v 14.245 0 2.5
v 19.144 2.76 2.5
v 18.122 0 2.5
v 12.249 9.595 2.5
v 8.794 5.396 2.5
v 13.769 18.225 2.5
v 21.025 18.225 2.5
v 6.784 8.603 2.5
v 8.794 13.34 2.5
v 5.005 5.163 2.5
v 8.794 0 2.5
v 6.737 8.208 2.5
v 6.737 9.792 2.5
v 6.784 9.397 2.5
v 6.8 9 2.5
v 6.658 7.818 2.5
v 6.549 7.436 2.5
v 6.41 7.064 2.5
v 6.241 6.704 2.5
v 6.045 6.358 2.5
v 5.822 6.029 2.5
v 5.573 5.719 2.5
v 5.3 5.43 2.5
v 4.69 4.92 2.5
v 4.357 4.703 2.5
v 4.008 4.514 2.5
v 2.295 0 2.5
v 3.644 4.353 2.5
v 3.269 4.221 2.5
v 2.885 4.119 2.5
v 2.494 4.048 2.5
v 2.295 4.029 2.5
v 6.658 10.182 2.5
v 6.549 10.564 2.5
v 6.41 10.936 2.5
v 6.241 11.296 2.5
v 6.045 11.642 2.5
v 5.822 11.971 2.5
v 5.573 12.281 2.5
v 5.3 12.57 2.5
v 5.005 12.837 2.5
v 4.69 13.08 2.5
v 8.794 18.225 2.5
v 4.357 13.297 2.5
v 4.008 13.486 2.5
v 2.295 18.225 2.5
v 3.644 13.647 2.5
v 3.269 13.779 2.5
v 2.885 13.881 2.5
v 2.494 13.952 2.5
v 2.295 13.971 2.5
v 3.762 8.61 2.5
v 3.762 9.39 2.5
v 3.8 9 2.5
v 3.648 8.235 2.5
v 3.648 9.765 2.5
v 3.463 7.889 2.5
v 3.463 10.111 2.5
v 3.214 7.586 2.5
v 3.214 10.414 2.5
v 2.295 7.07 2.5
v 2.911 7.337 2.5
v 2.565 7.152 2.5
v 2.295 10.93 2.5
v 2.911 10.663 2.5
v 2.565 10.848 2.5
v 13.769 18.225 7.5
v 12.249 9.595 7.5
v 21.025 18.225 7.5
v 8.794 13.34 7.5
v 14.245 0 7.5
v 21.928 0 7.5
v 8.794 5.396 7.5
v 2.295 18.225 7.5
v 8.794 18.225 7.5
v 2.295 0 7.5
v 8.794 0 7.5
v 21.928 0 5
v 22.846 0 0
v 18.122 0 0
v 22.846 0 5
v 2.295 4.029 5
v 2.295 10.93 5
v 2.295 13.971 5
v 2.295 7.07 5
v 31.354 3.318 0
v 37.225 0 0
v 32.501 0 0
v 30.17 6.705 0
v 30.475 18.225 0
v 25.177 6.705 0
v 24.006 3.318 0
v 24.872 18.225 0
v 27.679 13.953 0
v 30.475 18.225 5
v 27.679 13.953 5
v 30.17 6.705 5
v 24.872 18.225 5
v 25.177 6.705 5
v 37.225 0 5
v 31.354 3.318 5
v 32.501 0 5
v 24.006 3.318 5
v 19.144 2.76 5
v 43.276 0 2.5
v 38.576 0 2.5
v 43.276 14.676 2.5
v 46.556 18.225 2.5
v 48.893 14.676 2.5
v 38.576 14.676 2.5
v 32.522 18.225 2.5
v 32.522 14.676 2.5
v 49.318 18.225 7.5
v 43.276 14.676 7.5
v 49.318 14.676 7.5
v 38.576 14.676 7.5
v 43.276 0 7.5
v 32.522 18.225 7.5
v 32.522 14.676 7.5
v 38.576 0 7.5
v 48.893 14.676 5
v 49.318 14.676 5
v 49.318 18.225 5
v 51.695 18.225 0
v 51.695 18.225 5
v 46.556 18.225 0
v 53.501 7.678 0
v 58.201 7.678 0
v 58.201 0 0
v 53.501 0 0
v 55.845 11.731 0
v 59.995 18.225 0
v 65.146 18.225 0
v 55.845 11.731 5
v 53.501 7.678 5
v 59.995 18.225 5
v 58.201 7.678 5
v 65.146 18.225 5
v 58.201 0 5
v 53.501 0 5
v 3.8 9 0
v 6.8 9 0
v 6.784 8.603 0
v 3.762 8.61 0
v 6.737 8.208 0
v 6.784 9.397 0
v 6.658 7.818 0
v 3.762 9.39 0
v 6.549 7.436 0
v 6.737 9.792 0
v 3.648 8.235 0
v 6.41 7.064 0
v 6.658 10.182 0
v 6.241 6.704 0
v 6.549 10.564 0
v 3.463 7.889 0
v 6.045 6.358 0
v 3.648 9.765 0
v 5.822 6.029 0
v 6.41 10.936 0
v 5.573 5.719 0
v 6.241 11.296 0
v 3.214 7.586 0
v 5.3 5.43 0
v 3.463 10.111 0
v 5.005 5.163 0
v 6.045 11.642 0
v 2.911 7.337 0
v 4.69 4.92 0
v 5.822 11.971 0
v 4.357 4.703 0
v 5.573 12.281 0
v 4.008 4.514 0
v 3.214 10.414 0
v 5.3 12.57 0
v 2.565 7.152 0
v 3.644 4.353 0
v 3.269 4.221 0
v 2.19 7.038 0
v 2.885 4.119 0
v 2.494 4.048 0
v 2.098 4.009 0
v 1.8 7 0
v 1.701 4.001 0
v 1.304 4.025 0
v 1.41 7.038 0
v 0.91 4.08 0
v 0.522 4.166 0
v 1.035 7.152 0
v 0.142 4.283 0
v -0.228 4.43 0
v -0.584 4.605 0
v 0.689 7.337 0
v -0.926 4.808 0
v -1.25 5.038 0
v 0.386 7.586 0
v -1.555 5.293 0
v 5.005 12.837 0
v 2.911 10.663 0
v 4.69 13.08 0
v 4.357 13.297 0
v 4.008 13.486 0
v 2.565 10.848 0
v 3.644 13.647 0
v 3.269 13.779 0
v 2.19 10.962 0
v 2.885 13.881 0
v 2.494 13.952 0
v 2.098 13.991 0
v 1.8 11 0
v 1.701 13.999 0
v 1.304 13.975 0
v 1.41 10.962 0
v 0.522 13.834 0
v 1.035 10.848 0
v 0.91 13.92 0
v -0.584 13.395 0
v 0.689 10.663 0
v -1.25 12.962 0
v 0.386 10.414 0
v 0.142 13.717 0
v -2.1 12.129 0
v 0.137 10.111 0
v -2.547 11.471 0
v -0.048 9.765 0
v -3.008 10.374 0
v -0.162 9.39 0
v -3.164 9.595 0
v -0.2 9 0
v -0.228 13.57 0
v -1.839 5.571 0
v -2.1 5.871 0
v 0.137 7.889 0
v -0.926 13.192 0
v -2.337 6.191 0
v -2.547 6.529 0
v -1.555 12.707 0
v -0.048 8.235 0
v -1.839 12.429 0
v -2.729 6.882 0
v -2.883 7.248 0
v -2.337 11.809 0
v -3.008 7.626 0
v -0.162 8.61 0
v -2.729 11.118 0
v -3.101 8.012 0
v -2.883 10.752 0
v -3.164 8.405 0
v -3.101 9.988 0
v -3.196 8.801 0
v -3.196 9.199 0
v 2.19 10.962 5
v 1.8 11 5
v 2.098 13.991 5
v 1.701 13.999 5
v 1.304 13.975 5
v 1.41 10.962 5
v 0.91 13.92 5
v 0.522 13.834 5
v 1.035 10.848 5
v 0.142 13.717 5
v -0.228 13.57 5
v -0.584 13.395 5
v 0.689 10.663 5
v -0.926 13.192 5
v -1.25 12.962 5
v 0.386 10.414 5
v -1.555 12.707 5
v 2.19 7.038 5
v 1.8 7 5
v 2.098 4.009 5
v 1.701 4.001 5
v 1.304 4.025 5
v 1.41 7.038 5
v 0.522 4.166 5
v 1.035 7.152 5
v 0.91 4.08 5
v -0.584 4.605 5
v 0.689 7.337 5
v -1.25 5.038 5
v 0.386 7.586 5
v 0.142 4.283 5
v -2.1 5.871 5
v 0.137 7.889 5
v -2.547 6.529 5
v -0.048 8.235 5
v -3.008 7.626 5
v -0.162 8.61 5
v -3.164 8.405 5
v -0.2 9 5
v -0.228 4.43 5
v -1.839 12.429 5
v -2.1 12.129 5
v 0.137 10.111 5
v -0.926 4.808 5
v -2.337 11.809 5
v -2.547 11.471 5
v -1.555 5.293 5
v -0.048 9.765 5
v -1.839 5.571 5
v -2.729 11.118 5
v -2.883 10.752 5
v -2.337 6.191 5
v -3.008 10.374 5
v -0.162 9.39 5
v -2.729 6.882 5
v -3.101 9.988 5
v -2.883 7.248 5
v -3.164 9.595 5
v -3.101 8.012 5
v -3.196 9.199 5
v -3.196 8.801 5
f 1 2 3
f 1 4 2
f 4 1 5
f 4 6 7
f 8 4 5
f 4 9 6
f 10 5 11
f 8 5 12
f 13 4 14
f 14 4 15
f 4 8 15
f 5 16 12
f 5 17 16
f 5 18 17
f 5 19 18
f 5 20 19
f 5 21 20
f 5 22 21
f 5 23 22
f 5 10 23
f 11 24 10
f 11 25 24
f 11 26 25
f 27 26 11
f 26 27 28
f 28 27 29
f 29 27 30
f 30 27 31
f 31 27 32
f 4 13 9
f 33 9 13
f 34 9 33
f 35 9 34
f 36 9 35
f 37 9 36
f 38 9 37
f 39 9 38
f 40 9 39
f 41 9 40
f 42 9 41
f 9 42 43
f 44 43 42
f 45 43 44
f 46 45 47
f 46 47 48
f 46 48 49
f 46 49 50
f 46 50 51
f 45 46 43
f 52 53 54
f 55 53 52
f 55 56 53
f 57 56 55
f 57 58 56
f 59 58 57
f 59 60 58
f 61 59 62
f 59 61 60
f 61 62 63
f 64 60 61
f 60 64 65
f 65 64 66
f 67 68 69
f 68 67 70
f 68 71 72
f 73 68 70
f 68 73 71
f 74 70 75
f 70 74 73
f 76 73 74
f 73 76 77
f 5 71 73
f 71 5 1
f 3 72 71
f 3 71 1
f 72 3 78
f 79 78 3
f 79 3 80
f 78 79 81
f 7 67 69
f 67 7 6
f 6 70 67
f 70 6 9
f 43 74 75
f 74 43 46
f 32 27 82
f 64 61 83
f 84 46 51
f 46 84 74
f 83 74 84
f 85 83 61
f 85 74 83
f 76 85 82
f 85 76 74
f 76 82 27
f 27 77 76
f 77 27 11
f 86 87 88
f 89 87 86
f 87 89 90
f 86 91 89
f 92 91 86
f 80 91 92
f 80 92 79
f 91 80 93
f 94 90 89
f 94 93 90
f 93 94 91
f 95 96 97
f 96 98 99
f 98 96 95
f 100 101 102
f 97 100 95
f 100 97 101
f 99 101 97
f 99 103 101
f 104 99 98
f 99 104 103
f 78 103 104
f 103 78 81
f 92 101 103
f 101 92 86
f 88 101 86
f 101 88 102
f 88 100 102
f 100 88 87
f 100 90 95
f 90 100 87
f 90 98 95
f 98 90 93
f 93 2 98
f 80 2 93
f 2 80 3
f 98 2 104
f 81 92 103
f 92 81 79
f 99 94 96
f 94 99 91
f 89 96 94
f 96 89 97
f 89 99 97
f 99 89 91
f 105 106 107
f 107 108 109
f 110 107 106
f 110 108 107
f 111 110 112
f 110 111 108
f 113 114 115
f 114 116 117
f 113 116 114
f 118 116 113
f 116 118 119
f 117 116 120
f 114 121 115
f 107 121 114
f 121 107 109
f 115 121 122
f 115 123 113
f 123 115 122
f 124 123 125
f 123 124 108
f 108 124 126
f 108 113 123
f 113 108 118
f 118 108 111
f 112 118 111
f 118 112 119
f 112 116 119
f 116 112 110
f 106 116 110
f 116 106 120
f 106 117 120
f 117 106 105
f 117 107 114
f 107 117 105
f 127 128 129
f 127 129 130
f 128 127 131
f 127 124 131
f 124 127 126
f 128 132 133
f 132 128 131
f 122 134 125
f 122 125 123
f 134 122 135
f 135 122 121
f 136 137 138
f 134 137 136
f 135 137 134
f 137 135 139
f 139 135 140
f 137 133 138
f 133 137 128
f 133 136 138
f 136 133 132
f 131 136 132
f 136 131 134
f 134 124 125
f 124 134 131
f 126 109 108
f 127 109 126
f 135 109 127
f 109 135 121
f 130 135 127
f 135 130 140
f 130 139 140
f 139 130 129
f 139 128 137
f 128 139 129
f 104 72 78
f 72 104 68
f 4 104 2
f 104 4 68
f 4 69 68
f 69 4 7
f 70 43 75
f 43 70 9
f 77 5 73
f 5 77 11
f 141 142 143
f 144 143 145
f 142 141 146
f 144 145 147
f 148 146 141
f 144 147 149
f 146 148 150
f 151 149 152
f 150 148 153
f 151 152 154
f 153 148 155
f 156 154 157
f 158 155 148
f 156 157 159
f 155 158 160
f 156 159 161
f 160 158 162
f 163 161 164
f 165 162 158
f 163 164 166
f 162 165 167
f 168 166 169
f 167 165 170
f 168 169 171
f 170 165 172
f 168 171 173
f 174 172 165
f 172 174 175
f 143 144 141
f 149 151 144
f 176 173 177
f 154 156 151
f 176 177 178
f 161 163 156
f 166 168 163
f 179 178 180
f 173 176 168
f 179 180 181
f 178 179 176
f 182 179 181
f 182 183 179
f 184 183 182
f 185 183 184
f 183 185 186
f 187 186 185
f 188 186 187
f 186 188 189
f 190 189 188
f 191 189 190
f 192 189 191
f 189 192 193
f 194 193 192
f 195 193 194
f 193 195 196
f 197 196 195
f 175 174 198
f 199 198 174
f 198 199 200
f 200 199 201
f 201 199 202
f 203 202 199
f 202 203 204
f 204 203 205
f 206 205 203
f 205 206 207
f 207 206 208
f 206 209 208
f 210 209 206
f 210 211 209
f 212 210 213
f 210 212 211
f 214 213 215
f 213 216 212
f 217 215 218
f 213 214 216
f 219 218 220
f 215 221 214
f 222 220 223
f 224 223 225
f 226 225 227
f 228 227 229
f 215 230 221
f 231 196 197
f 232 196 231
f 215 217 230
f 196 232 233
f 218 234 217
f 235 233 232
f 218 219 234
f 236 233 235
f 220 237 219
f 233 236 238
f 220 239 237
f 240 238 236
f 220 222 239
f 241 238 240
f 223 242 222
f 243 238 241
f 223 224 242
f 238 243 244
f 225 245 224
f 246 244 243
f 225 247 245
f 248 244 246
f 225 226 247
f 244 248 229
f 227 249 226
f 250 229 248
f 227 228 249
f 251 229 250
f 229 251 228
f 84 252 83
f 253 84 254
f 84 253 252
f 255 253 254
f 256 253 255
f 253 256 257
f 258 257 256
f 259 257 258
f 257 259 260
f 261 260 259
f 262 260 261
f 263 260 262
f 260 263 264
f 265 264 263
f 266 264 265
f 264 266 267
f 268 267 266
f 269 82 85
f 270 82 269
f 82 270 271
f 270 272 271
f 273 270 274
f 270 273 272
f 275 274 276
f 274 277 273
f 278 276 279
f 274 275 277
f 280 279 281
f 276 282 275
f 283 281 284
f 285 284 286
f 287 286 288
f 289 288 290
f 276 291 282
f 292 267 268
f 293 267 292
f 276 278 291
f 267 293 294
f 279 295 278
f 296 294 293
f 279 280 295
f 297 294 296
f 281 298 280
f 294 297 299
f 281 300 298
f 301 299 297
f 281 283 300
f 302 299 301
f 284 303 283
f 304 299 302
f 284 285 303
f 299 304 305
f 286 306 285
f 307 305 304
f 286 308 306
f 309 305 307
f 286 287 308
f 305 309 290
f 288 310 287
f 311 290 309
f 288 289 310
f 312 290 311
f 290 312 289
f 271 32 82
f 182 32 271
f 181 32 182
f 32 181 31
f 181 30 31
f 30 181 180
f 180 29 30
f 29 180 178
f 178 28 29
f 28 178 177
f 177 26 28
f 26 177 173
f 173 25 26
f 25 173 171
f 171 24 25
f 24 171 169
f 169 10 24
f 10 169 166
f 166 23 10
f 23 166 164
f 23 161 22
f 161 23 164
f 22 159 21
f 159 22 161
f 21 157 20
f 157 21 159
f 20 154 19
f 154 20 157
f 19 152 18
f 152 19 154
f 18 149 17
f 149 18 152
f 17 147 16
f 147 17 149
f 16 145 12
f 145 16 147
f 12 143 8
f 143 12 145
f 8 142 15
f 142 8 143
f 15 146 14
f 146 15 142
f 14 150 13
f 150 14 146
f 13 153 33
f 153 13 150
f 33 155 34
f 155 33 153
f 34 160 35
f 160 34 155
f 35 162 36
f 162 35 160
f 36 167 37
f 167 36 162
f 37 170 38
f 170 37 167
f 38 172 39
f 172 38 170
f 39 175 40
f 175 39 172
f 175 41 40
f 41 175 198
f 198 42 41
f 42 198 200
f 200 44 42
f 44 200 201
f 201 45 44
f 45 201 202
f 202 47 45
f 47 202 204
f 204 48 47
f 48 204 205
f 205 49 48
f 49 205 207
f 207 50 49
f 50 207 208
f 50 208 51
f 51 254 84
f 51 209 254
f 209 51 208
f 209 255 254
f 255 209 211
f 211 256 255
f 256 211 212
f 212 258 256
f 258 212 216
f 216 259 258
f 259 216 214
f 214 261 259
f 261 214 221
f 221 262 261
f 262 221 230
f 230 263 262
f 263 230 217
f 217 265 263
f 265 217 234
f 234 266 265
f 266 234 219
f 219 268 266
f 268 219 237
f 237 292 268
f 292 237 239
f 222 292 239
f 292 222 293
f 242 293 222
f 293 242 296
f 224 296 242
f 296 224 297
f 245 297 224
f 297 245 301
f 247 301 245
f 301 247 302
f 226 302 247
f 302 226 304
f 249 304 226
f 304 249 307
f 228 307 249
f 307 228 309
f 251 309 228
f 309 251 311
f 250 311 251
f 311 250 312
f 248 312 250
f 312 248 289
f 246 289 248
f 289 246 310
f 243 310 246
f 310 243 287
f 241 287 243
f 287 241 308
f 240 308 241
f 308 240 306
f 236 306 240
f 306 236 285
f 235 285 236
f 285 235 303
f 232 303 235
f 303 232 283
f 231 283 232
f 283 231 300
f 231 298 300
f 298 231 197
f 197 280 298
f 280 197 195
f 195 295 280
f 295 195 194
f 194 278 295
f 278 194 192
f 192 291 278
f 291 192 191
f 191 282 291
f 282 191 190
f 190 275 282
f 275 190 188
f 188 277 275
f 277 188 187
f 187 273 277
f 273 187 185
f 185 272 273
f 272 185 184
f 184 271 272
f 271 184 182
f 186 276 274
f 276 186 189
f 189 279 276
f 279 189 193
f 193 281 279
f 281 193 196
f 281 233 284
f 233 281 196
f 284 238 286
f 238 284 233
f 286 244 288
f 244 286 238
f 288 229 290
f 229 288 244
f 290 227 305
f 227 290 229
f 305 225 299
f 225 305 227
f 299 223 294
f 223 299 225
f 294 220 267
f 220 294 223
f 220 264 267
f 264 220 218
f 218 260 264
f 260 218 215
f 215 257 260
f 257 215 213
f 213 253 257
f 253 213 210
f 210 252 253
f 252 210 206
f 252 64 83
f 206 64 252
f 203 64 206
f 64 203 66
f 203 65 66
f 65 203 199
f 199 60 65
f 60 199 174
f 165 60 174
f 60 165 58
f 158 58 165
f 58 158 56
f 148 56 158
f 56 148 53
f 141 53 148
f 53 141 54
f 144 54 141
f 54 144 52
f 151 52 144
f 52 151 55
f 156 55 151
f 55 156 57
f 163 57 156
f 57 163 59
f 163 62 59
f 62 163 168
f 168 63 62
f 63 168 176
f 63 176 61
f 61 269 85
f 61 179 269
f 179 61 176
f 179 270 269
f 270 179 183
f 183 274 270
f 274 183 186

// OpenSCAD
// file: nametag.scad
$fa=1;
$fs=0.4;
font = "Inknut Antiqua:weight=900";
size = 18;
height = 5;

module letter(character, x_offset, y_offset) {
  translate([size * x_offset, 0, y_offset ? 0.5 * height : 0])
    linear_extrude(height = height)
    text(character, font = font, size = size);
}

module nametag(characters, ring_offset) {
  translate([ring_offset[0] * size, ring_offset[1] * size, 0])
    linear_extrude(height = height)
    difference() {
      circle(5);
      circle(2);
    }
  for (character_index = [0: len(characters) - 1]) {
    letter(characters[character_index][0], characters[character_index][1], character_index % 2 == 0);
  };
}
// main file
use <./nametag.scad>

nametag(
  ring_offset = [0.1, 0.5],
  characters = [["K", 0], ["A", 1], ["T", 1.8], ["Y", 2.6], ["K", 0.1]]
);
